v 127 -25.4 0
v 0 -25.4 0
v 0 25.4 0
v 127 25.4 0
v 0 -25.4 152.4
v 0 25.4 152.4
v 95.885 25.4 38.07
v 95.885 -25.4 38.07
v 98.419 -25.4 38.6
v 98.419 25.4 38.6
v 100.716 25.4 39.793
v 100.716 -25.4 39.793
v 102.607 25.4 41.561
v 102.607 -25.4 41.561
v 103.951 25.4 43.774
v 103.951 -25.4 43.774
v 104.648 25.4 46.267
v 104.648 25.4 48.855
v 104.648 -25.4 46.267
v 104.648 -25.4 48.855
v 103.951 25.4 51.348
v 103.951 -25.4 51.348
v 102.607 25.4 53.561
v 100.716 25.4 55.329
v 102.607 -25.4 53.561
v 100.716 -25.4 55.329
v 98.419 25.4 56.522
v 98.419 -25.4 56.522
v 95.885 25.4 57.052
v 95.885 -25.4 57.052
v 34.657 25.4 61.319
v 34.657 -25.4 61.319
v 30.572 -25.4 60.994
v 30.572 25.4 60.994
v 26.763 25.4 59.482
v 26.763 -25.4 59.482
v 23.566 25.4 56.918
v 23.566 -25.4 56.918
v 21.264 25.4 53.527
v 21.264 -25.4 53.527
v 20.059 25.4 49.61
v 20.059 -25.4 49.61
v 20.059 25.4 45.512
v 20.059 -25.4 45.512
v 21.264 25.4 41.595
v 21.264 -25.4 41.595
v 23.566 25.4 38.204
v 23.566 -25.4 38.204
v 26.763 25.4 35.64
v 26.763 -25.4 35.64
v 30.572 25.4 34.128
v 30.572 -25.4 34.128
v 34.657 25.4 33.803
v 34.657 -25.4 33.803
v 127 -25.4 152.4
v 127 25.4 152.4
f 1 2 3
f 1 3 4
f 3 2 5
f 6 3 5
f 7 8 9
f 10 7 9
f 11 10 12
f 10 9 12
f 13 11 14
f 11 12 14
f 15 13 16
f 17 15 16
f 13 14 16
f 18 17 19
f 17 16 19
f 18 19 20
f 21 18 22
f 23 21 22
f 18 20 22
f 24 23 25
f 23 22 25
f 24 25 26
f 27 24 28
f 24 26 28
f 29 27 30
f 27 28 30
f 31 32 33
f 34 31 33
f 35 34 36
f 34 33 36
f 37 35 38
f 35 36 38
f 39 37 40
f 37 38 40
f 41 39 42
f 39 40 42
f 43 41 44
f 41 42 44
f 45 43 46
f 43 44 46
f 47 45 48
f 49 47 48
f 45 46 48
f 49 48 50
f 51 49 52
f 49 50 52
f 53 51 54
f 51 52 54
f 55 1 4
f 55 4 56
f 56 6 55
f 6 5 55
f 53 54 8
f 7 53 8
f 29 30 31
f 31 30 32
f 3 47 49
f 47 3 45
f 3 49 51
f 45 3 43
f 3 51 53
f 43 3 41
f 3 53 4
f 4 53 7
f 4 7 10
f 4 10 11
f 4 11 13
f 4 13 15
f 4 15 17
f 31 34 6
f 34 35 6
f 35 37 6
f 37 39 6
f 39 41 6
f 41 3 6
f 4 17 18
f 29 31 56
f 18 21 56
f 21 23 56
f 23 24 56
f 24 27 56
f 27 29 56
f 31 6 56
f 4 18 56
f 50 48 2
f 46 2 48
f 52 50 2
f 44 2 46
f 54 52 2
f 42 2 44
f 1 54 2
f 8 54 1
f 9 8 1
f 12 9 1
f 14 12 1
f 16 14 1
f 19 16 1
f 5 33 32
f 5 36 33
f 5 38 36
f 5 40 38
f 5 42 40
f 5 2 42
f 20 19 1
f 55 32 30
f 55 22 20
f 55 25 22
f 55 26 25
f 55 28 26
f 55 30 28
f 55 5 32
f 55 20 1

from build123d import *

# Parameters (mm, degrees)
F0_W          = 127
F0_H          = 152.4
F1_DEPTH      = 25.4
F1_DEPTH_BACK = 25.4
F3_DEPTH      = 50.801


with BuildPart() as f1:
    # F0 (on Front) → F1 (new body, two sides)
    with BuildSketch(Plane.XZ) as f1_sk:
        with Locations((63.5, 76.2)):
            Rectangle(F0_W, F0_H)
    extrude(amount=F1_DEPTH)
    extrude(f1_sk.sketch, amount=-F1_DEPTH_BACK)

    # F2 (on face) → F3 (cut, through all)
    with BuildSketch(Plane.XZ.offset(25.4)):
        with BuildLine():
            Line((34.656941, 33.802745), (95.884816, 38.070348))
            ThreePointArc((95.884816, 38.070348), (104.736954, 47.56096), (95.884816, 57.051572))
            Line((95.884816, 57.051572), (34.656941, 61.319176))
            ThreePointArc((34.656941, 61.319176), (19.906394, 47.56096), (34.656941, 33.802745))
        make_face()
    extrude(amount=-F3_DEPTH, mode=Mode.SUBTRACT)


solid = f1.part
